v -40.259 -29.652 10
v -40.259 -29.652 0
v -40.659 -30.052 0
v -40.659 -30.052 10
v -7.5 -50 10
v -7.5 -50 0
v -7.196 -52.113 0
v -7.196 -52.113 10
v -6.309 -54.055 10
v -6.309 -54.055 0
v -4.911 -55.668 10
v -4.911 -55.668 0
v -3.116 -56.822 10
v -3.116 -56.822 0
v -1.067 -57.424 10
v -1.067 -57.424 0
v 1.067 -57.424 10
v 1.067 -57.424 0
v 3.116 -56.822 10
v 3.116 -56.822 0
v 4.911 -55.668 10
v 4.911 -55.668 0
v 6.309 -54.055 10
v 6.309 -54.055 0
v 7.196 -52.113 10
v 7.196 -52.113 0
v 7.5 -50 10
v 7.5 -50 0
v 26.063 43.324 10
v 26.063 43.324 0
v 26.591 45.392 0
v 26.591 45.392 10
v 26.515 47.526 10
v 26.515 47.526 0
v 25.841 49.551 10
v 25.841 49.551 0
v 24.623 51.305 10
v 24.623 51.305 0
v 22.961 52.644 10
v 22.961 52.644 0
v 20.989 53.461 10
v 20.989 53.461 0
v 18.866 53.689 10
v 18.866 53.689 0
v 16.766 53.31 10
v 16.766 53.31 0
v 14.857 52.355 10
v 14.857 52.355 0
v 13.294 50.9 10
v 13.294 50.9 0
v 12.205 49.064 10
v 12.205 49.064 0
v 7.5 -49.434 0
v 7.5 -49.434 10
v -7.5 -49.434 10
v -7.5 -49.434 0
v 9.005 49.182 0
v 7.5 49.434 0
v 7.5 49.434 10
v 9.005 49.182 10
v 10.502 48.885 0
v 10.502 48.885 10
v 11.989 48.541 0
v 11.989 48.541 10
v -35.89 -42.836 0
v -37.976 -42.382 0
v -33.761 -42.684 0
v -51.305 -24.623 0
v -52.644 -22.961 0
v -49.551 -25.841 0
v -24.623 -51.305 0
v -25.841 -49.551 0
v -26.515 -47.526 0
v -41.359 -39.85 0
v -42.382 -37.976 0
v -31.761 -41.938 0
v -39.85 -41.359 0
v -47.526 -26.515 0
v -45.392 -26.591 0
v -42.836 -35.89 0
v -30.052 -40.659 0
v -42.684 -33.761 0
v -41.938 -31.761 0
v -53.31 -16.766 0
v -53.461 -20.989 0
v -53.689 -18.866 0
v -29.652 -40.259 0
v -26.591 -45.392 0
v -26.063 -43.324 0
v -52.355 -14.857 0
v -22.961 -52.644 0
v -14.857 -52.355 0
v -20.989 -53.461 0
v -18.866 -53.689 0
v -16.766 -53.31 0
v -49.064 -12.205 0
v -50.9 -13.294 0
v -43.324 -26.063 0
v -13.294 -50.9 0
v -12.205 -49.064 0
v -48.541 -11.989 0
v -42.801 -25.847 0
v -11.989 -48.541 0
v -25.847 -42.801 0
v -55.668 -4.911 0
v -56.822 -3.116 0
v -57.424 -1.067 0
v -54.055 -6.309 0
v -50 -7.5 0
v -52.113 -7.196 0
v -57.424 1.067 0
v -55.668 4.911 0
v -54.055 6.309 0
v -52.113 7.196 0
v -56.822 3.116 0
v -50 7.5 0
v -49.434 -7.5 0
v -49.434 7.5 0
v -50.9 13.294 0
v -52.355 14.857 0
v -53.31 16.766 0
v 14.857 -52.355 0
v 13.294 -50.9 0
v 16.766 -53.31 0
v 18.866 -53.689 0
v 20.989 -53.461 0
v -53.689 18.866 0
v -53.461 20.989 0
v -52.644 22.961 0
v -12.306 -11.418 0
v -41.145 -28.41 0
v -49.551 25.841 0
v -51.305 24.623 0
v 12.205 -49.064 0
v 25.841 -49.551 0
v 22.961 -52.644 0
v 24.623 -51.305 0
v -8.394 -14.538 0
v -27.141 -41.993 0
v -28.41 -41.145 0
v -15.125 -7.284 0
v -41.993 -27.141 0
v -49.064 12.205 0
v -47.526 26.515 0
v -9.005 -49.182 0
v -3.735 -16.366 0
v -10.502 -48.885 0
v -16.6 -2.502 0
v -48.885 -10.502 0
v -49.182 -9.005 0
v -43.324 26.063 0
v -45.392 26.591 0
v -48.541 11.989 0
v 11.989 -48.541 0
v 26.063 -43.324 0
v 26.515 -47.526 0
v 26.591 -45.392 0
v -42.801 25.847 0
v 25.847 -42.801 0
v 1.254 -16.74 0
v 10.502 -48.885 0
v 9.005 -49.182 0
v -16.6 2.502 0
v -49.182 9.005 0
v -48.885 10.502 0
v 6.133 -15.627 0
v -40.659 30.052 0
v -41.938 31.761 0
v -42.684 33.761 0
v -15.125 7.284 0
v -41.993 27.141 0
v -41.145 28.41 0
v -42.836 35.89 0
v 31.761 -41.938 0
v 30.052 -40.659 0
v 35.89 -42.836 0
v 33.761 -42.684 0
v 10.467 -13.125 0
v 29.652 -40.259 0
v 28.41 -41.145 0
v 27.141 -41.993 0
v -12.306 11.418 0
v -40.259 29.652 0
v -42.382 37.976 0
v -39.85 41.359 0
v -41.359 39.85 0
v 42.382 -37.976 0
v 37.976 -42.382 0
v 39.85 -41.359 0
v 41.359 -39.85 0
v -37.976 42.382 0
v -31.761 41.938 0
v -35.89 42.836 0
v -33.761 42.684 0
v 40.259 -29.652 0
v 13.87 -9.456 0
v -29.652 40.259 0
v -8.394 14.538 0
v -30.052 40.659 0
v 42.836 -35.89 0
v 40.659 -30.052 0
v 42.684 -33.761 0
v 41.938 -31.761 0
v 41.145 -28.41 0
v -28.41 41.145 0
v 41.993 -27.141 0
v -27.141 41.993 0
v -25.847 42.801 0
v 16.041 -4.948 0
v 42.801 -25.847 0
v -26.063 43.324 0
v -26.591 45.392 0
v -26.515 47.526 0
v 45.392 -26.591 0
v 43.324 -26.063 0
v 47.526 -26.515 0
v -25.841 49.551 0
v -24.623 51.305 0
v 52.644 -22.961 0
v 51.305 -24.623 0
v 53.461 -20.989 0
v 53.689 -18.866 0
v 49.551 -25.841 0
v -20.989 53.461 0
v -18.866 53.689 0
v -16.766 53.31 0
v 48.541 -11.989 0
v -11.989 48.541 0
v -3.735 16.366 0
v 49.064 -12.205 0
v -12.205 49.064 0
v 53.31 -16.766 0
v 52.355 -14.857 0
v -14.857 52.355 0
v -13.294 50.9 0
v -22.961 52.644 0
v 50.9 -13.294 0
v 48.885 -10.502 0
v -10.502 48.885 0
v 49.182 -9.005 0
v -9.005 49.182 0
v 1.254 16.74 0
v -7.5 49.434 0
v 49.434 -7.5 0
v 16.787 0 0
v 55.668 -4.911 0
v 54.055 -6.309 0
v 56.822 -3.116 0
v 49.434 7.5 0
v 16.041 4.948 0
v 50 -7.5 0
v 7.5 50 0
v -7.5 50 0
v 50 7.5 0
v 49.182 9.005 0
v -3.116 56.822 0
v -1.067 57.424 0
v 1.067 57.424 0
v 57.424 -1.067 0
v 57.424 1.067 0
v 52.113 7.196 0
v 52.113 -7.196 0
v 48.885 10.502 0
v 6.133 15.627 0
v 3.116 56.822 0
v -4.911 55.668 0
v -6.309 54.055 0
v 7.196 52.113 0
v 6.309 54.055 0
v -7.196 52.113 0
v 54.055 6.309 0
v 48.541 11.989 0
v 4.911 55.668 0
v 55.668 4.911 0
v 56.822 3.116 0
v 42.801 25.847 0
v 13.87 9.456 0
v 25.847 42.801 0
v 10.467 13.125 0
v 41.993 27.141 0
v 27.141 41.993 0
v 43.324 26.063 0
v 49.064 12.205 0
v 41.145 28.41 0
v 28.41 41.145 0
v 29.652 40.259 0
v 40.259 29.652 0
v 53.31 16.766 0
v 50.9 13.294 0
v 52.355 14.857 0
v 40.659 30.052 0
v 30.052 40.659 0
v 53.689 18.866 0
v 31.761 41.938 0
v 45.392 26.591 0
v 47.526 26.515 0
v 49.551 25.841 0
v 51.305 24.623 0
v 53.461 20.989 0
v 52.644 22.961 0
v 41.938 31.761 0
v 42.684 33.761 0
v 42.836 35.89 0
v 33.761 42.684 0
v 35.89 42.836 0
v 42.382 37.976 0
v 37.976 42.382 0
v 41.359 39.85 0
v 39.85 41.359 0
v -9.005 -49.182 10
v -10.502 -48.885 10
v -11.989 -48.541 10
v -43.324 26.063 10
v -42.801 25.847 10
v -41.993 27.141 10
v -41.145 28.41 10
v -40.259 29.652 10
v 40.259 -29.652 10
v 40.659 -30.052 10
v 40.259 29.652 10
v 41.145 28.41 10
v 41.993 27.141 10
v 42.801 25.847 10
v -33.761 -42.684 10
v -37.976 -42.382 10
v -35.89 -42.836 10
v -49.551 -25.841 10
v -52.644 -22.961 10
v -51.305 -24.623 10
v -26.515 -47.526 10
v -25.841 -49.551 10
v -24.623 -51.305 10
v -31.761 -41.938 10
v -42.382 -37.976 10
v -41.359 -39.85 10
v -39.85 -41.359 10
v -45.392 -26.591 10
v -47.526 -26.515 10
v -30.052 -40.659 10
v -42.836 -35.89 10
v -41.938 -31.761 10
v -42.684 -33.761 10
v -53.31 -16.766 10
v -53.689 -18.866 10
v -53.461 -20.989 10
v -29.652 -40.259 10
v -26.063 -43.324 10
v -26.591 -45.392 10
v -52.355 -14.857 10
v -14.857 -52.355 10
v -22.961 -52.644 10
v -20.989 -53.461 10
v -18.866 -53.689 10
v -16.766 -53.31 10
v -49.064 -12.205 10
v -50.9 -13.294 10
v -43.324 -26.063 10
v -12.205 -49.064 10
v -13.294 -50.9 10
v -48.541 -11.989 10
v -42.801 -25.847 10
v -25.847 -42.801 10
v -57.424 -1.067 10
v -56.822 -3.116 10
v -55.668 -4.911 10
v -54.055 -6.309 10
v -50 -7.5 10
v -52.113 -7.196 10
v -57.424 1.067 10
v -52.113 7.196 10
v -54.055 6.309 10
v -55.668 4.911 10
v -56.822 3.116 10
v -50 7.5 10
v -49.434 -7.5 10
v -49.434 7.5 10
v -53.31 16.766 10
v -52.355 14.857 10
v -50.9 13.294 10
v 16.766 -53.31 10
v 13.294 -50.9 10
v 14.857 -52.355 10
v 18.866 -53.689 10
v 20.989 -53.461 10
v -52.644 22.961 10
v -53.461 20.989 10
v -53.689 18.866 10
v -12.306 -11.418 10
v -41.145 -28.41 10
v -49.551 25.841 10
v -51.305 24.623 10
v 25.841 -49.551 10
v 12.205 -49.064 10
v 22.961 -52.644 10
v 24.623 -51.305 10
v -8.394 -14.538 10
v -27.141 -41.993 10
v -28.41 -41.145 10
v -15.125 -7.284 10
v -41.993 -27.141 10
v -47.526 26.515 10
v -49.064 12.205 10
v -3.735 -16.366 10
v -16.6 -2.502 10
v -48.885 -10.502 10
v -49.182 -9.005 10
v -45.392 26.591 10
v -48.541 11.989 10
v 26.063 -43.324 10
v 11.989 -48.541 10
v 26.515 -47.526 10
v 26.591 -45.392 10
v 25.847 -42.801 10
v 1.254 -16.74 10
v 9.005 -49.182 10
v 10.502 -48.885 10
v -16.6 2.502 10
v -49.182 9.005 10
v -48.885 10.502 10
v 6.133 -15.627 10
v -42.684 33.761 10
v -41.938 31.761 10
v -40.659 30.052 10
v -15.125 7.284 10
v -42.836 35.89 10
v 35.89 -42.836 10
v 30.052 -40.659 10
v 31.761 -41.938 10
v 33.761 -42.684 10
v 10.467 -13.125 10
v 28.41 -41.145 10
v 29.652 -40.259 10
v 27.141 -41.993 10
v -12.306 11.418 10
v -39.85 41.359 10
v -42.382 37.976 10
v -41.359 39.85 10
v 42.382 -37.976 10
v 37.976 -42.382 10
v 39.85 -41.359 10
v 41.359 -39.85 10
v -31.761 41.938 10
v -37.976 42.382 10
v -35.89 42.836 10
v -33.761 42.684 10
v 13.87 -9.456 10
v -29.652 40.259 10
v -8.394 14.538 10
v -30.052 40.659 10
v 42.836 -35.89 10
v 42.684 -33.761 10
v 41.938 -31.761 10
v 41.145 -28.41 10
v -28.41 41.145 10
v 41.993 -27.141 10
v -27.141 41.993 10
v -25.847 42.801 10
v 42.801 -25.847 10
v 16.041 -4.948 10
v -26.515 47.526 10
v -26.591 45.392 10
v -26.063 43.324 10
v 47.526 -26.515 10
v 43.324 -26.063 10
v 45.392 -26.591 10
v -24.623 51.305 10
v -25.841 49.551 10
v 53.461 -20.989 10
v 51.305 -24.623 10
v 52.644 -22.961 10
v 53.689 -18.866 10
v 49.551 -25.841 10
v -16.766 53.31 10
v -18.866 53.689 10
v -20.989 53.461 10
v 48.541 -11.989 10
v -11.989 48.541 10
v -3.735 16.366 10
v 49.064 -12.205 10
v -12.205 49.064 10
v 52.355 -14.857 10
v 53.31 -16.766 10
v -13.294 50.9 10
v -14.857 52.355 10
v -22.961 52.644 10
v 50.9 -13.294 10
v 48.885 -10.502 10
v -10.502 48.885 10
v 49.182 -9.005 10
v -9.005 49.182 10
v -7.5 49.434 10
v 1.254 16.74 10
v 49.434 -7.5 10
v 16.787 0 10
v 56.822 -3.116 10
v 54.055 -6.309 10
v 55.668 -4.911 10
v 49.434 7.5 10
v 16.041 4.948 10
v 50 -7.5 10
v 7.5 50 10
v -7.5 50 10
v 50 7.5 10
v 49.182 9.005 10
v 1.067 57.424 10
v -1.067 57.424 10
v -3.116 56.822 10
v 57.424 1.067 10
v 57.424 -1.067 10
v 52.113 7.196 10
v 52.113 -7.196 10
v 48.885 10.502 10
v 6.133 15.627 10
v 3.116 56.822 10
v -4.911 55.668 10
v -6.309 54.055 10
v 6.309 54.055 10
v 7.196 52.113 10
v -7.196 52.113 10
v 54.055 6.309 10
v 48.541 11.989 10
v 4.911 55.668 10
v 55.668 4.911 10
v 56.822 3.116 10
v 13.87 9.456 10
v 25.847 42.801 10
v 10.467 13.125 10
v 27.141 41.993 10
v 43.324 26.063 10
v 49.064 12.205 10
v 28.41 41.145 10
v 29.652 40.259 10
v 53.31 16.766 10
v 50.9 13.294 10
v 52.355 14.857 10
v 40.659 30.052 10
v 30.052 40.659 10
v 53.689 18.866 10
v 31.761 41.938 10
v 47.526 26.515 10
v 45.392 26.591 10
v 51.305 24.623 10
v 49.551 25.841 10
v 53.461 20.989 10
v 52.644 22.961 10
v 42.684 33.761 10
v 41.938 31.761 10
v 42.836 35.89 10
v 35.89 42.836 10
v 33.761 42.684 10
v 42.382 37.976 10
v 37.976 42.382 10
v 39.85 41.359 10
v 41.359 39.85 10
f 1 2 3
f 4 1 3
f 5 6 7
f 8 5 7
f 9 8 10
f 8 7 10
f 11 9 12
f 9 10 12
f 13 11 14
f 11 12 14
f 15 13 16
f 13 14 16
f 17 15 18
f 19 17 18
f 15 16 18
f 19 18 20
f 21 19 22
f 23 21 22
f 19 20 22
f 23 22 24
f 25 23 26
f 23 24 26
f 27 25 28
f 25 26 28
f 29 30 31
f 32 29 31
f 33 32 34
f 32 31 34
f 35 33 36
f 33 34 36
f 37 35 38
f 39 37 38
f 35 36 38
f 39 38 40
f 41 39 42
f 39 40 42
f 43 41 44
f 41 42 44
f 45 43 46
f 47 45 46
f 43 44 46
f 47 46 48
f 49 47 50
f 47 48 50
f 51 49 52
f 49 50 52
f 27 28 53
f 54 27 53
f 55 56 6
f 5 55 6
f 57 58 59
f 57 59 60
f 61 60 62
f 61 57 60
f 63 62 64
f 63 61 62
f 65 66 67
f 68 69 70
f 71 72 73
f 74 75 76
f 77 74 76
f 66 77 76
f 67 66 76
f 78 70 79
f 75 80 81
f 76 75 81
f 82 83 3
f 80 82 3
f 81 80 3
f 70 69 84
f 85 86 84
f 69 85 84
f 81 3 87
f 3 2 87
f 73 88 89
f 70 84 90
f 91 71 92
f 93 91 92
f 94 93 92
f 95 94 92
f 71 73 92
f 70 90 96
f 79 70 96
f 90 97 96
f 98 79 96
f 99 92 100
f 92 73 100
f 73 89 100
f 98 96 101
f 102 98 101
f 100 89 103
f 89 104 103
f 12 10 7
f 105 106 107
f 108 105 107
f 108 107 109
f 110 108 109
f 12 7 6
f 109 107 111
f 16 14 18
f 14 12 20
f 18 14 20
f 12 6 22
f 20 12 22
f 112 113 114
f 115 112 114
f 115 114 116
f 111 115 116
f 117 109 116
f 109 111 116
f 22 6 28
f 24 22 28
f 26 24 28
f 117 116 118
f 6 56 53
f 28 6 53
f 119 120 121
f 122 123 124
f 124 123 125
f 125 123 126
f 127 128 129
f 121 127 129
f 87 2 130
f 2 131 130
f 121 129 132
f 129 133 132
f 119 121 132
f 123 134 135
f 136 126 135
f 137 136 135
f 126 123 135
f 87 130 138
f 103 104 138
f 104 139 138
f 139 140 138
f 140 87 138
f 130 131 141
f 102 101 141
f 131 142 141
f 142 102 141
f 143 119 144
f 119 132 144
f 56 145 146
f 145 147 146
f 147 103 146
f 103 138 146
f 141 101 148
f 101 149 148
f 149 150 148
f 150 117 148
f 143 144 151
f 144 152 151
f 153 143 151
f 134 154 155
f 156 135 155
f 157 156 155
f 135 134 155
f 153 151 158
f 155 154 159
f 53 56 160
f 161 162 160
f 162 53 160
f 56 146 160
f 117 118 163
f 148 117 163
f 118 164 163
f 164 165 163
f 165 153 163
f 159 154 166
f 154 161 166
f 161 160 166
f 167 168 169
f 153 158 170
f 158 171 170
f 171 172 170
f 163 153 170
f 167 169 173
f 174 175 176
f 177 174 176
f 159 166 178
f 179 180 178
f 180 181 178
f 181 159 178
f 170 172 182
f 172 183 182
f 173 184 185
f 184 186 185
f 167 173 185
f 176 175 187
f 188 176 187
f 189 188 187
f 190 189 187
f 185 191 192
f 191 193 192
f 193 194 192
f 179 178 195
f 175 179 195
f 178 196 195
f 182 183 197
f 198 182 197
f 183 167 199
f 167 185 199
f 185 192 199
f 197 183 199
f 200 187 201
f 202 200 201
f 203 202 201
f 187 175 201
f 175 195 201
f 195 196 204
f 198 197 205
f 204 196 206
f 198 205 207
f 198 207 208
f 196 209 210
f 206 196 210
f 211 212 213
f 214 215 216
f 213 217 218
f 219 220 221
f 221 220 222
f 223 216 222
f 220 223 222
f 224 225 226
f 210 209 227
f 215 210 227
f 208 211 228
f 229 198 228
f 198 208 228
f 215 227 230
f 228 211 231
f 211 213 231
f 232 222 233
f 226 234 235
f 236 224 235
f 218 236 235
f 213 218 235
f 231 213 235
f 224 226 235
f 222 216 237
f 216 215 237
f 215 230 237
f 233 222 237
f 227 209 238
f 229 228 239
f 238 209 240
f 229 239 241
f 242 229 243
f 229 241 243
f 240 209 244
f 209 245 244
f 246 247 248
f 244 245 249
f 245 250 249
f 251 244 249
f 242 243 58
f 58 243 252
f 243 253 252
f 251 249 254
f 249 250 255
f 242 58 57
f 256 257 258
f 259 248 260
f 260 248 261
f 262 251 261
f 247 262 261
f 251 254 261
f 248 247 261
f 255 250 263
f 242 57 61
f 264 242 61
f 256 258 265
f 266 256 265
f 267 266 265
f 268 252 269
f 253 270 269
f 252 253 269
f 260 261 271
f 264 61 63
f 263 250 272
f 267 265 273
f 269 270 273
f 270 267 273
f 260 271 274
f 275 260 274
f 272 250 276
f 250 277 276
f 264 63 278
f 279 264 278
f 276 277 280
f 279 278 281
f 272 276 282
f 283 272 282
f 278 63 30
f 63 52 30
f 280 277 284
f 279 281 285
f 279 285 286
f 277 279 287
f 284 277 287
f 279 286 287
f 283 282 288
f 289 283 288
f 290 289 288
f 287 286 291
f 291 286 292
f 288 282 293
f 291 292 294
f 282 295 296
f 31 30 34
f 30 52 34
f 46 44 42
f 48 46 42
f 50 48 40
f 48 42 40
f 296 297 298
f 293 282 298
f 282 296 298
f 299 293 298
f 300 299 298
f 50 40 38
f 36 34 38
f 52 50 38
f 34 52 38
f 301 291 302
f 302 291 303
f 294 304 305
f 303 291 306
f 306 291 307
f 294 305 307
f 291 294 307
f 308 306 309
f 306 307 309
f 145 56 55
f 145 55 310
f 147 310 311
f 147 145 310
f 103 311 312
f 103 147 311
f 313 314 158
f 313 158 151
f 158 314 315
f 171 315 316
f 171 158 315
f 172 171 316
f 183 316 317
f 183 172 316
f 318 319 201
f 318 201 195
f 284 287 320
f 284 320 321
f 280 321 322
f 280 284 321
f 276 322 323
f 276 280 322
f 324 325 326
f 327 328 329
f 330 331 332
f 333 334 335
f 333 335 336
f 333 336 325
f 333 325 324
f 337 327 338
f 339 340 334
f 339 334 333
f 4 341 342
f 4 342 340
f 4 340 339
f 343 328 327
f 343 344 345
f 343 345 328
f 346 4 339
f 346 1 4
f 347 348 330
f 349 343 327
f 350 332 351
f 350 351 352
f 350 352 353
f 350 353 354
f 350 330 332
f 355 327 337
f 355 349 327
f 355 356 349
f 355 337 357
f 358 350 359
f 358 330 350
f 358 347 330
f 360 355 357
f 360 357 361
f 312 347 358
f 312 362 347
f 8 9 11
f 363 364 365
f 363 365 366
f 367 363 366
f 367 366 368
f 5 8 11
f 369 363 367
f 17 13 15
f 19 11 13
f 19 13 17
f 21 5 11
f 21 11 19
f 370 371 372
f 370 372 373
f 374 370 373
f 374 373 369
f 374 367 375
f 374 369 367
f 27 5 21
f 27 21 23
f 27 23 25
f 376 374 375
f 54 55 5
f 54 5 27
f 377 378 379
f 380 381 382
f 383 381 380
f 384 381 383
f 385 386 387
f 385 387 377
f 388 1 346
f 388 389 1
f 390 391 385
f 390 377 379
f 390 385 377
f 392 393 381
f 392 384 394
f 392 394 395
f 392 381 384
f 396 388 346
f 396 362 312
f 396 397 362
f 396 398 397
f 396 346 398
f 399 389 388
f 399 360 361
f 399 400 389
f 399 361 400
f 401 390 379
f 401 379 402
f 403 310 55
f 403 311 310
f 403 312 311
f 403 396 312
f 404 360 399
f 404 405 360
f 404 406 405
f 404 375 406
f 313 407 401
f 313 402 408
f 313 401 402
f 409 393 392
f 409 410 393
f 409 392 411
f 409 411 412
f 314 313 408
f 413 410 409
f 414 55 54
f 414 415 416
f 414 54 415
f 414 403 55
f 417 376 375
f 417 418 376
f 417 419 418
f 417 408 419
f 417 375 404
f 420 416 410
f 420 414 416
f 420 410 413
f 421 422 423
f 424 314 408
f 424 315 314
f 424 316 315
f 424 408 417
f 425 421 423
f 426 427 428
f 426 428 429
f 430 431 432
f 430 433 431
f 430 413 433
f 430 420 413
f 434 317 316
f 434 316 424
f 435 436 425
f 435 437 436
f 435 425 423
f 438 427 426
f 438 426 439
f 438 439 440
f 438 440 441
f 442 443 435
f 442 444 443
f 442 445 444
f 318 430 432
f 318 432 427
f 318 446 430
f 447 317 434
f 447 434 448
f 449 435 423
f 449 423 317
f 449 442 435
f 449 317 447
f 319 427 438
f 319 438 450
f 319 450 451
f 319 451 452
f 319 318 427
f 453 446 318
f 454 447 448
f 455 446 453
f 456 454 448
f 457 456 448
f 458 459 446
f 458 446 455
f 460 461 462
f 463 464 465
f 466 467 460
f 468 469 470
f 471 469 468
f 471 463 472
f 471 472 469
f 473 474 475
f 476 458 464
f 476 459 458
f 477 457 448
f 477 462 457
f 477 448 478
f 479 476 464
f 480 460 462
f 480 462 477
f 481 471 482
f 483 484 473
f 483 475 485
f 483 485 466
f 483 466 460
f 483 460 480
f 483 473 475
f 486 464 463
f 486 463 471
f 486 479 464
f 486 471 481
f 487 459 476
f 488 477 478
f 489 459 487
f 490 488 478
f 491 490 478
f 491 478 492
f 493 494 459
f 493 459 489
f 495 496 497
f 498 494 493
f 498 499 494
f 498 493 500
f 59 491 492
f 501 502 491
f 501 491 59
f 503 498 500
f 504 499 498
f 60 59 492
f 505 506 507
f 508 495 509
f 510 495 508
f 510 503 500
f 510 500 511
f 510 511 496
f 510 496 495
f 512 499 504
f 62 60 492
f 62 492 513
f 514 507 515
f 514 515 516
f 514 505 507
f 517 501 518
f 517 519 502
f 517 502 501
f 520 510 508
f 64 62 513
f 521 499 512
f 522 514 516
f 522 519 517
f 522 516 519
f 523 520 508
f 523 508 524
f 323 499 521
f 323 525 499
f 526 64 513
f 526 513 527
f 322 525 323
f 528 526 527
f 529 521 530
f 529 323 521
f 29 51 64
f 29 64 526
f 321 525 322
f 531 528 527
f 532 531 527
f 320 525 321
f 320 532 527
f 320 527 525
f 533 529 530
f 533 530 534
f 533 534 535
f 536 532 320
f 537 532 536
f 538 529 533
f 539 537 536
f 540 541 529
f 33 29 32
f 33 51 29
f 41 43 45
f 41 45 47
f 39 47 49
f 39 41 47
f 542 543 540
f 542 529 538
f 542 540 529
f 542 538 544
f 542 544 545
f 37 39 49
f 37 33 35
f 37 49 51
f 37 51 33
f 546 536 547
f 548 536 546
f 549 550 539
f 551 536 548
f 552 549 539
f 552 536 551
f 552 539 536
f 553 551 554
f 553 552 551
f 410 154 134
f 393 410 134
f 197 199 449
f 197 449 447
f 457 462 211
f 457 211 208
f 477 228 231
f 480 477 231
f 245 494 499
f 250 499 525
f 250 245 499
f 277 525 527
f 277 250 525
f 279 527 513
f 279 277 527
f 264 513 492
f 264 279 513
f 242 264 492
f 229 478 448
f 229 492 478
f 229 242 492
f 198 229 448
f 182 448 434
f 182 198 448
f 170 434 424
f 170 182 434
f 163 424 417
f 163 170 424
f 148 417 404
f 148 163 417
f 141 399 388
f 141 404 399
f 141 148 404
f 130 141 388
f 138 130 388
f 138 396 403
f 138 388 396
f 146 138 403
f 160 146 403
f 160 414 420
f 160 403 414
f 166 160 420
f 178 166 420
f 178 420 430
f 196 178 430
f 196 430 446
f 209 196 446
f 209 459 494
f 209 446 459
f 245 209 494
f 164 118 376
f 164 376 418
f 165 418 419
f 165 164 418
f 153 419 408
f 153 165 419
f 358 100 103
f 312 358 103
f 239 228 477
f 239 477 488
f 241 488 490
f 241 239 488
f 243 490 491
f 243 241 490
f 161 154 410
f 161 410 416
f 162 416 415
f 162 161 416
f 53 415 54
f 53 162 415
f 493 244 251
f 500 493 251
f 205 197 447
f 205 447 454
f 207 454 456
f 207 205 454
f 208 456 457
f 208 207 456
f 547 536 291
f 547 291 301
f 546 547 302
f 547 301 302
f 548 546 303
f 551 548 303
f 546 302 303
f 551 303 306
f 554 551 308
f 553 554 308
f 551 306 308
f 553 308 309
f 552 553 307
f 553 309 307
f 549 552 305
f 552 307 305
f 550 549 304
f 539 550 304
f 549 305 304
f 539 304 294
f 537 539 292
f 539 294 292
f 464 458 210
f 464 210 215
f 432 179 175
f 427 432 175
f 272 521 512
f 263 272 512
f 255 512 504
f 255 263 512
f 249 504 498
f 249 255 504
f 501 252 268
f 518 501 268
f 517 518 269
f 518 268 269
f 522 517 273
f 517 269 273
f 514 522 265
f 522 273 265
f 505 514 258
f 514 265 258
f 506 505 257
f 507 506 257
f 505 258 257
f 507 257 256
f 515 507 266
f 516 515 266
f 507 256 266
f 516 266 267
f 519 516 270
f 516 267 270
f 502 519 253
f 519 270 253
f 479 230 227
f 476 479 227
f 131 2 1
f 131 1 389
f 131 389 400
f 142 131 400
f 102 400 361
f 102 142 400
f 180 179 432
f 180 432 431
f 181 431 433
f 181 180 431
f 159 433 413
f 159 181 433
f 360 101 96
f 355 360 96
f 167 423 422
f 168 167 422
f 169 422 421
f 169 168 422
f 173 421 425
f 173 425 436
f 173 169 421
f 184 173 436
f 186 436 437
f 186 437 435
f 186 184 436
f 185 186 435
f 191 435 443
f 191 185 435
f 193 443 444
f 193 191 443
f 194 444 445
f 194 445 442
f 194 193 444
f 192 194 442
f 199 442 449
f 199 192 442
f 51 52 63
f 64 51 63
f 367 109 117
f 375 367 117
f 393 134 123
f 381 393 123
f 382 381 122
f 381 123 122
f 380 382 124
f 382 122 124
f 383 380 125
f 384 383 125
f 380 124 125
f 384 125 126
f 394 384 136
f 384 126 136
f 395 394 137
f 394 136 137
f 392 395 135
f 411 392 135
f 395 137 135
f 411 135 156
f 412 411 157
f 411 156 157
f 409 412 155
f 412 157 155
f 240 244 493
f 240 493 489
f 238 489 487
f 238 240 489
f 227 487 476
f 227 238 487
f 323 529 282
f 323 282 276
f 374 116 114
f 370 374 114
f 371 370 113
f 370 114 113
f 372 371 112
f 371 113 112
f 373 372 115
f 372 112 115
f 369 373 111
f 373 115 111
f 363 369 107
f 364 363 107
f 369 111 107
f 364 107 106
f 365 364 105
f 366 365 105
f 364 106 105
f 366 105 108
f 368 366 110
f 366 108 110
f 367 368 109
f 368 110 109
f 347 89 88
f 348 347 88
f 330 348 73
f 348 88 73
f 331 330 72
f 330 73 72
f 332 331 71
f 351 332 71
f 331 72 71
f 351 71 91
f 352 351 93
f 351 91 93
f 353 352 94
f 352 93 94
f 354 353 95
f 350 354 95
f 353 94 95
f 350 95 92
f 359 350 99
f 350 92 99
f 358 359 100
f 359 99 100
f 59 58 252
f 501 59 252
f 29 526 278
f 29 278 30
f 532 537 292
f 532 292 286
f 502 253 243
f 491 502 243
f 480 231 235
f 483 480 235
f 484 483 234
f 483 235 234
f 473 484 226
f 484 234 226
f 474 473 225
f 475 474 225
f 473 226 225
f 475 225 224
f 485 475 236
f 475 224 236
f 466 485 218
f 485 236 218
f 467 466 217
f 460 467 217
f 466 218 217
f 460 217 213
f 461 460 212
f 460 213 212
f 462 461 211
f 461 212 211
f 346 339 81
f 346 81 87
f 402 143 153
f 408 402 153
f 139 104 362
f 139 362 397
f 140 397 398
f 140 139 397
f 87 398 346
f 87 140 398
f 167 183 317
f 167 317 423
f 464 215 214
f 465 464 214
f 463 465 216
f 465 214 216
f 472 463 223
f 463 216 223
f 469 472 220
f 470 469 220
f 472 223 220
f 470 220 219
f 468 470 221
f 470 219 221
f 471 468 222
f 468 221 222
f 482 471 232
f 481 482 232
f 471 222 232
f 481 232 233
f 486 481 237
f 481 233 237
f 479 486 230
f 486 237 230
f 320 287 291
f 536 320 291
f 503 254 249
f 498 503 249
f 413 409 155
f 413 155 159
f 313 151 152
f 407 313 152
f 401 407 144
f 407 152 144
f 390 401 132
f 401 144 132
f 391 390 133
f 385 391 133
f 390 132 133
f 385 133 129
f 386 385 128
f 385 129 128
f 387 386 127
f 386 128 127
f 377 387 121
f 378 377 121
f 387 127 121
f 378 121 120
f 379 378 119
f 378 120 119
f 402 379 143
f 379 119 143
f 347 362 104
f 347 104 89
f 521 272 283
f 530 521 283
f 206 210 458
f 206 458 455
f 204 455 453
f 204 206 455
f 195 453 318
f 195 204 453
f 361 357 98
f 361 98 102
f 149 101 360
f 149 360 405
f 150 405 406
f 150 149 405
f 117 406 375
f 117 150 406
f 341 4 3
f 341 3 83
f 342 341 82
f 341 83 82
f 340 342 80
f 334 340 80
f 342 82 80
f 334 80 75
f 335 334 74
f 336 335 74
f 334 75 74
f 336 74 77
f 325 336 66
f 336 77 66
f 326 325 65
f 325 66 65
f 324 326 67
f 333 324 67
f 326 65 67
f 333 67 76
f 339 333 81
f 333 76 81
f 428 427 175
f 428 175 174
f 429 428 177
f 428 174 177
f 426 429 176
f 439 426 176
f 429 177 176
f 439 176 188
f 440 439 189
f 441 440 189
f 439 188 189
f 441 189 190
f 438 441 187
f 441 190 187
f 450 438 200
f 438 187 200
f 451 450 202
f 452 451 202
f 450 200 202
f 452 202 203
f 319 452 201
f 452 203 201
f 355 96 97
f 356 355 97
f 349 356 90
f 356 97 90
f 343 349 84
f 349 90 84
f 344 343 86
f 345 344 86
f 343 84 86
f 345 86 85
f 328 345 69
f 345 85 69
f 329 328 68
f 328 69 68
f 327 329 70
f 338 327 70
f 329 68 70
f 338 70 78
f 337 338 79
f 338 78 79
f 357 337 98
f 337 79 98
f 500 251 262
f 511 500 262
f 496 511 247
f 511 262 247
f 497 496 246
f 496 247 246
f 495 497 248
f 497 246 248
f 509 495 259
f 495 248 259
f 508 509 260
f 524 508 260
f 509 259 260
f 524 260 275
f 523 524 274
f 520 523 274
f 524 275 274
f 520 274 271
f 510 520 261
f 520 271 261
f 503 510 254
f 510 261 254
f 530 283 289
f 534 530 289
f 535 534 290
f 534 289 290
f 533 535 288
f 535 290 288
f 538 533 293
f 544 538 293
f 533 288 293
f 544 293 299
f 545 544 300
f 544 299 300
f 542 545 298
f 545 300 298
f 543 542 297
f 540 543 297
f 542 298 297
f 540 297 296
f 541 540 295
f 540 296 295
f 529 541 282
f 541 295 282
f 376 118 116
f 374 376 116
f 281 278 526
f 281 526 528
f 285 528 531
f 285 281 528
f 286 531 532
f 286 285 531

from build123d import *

# Parameters (mm, degrees)
BOSS_EXTRUDE1_DEPTH     = 10
SKETCH3_R               = 16.787014752
CUT_EXTRUDE6_DEPTH      = 11
CUT_EXTRUDE6_DEPTH_BACK = 35


with BuildPart() as part:
    # Sketch2 → Boss-Extrude1 (new body)
    with BuildSketch(Plane.XY):
        with BuildLine():
            ThreePointArc((-25.846784031, 42.801212077), (-19.134171618, 46.193976626), (-11.988591043, 48.541463563))
            Line((-11.988591043, 48.541463563), (-12.205075124, 49.064102368))
            ThreePointArc((-12.205075124, 49.064102368), (-22.004297361, 53.123073119), (-26.063268112, 43.323850883))
            Line((-26.063268112, 43.323850883), (-25.846784031, 42.801212077))
        make_face()
        with BuildLine():
            ThreePointArc((-7.5, 49.434299833), (0, 50), (7.5, 49.434299833))
            Line((7.5, 49.434299833), (7.5, 50))
            ThreePointArc((7.5, 50), (0, 57.5), (-7.5, 50))
            Line((-7.5, 50), (-7.5, 49.434299833))
        make_face()
        with BuildLine():
            Line((12.205075124, 49.064102368), (11.988591043, 48.541463563))
            ThreePointArc((11.988591043, 48.541463563), (19.134171618, 46.193976626), (25.846784031, 42.801212077))
            Line((25.846784031, 42.801212077), (26.063268112, 43.323850883))
            ThreePointArc((26.063268112, 43.323850883), (22.004297361, 53.123073119), (12.205075124, 49.064102368))
        make_face()
        with BuildLine():
            Line((30.0520382, 40.658639918), (29.652027776, 40.258629494))
            ThreePointArc((29.652027776, 40.258629494), (35.355339059, 35.355339059), (40.258629494, 29.652027776))
            Line((40.258629494, 29.652027776), (40.658639918, 30.0520382))
            ThreePointArc((40.658639918, 30.0520382), (40.658639918, 40.658639918), (30.0520382, 40.658639918))
        make_face()
        with BuildLine():
            Line((43.323850883, 26.063268112), (42.801212077, 25.846784031))
            ThreePointArc((42.801212077, 25.846784031), (46.193976626, 19.134171618), (48.541463563, 11.988591043))
            Line((48.541463563, 11.988591043), (49.064102368, 12.205075124))
            ThreePointArc((49.064102368, 12.205075124), (53.123073119, 22.004297361), (43.323850883, 26.063268112))
        make_face()
        with BuildLine():
            Line((50, 7.5), (49.434299833, 7.5))
            ThreePointArc((49.434299833, 7.5), (50, 0), (49.434299833, -7.5))
            Line((49.434299833, -7.5), (50, -7.5))
            ThreePointArc((50, -7.5), (57.5, 0), (50, 7.5))
        make_face()
        with BuildLine():
            Line((49.064102368, -12.205075124), (48.541463563, -11.988591043))
            ThreePointArc((48.541463563, -11.988591043), (46.193976626, -19.134171618), (42.801212077, -25.846784031))
            Line((42.801212077, -25.846784031), (43.323850883, -26.063268112))
            ThreePointArc((43.323850883, -26.063268112), (53.123073119, -22.004297361), (49.064102368, -12.205075124))
        make_face()
        with BuildLine():
            Line((40.658639918, -30.0520382), (40.258629494, -29.652027776))
            ThreePointArc((40.258629494, -29.652027776), (35.355339059, -35.355339059), (29.652027776, -40.258629494))
            Line((29.652027776, -40.258629494), (30.0520382, -40.658639918))
            ThreePointArc((30.0520382, -40.658639918), (40.658639918, -40.658639918), (40.658639918, -30.0520382))
        make_face()
        with BuildLine():
            Line((26.063268112, -43.323850883), (25.846784031, -42.801212077))
            ThreePointArc((25.846784031, -42.801212077), (19.134171618, -46.193976626), (11.988591043, -48.541463563))
            Line((11.988591043, -48.541463563), (12.205075124, -49.064102368))
            ThreePointArc((12.205075124, -49.064102368), (22.004297361, -53.123073119), (26.063268112, -43.323850883))
        make_face()
        with BuildLine():
            Line((7.5, -50), (7.5, -49.434299833))
            ThreePointArc((7.5, -49.434299833), (0, -50), (-7.5, -49.434299833))
            Line((-7.5, -49.434299833), (-7.5, -50))
            ThreePointArc((-7.5, -50), (0, -57.5), (7.5, -50))
        make_face()
        with BuildLine():
            ThreePointArc((-11.988591043, -48.541463563), (-19.134171618, -46.193976626), (-25.846784031, -42.801212077))
            Line((-25.846784031, -42.801212077), (-26.063268112, -43.323850883))
            ThreePointArc((-26.063268112, -43.323850883), (-22.004297361, -53.123073119), (-12.205075124, -49.064102368))
            Line((-12.205075124, -49.064102368), (-11.988591043, -48.541463563))
        make_face()
        with BuildLine():
            ThreePointArc((-29.652027776, -40.258629494), (-35.355339059, -35.355339059), (-40.258629494, -29.652027776))
            Line((-40.258629494, -29.652027776), (-40.658639918, -30.0520382))
            ThreePointArc((-40.658639918, -30.0520382), (-40.658639918, -40.658639918), (-30.0520382, -40.658639918))
            Line((-30.0520382, -40.658639918), (-29.652027776, -40.258629494))
        make_face()
        with BuildLine():
            ThreePointArc((-42.801212077, -25.846784031), (-46.193976626, -19.134171618), (-48.541463563, -11.988591043))
            Line((-48.541463563, -11.988591043), (-49.064102368, -12.205075124))
            ThreePointArc((-49.064102368, -12.205075124), (-53.123073119, -22.004297361), (-43.323850883, -26.063268112))
            Line((-43.323850883, -26.063268112), (-42.801212077, -25.846784031))
        make_face()
        with BuildLine():
            ThreePointArc((-49.434299833, -7.5), (-50, 0), (-49.434299833, 7.5))
            Line((-49.434299833, 7.5), (-50, 7.5))
            ThreePointArc((-50, 7.5), (-57.5, 0), (-50, -7.5))
            Line((-50, -7.5), (-49.434299833, -7.5))
        make_face()
        with BuildLine():
            ThreePointArc((-48.541463563, 11.988591043), (-46.193976626, 19.134171618), (-42.801212077, 25.846784031))
            Line((-42.801212077, 25.846784031), (-43.323850883, 26.063268112))
            ThreePointArc((-43.323850883, 26.063268112), (-53.123073119, 22.004297361), (-49.064102368, 12.205075124))
            Line((-49.064102368, 12.205075124), (-48.541463563, 11.988591043))
        make_face()
        with BuildLine():
            Line((-40.258629494, 29.652027776), (-40.658639918, 30.0520382))
            ThreePointArc((-40.658639918, 30.0520382), (-40.658639918, 40.658639918), (-30.0520382, 40.658639918))
            Line((-30.0520382, 40.658639918), (-29.652027776, 40.258629494))
            ThreePointArc((-29.652027776, 40.258629494), (35.355339059, -35.355339059), (-40.258629494, 29.652027776))
        make_face()
    extrude(amount=BOSS_EXTRUDE1_DEPTH)

    # Sketch3 → Cut-Extrude6 (cut, two sides)
    with BuildSketch(Plane.XY) as cut_extrude6_sk:
        Circle(SKETCH3_R)
    extrude(amount=CUT_EXTRUDE6_DEPTH, mode=Mode.SUBTRACT)
    extrude(cut_extrude6_sk.sketch, amount=-CUT_EXTRUDE6_DEPTH_BACK, mode=Mode.SUBTRACT)


solid = part.part
